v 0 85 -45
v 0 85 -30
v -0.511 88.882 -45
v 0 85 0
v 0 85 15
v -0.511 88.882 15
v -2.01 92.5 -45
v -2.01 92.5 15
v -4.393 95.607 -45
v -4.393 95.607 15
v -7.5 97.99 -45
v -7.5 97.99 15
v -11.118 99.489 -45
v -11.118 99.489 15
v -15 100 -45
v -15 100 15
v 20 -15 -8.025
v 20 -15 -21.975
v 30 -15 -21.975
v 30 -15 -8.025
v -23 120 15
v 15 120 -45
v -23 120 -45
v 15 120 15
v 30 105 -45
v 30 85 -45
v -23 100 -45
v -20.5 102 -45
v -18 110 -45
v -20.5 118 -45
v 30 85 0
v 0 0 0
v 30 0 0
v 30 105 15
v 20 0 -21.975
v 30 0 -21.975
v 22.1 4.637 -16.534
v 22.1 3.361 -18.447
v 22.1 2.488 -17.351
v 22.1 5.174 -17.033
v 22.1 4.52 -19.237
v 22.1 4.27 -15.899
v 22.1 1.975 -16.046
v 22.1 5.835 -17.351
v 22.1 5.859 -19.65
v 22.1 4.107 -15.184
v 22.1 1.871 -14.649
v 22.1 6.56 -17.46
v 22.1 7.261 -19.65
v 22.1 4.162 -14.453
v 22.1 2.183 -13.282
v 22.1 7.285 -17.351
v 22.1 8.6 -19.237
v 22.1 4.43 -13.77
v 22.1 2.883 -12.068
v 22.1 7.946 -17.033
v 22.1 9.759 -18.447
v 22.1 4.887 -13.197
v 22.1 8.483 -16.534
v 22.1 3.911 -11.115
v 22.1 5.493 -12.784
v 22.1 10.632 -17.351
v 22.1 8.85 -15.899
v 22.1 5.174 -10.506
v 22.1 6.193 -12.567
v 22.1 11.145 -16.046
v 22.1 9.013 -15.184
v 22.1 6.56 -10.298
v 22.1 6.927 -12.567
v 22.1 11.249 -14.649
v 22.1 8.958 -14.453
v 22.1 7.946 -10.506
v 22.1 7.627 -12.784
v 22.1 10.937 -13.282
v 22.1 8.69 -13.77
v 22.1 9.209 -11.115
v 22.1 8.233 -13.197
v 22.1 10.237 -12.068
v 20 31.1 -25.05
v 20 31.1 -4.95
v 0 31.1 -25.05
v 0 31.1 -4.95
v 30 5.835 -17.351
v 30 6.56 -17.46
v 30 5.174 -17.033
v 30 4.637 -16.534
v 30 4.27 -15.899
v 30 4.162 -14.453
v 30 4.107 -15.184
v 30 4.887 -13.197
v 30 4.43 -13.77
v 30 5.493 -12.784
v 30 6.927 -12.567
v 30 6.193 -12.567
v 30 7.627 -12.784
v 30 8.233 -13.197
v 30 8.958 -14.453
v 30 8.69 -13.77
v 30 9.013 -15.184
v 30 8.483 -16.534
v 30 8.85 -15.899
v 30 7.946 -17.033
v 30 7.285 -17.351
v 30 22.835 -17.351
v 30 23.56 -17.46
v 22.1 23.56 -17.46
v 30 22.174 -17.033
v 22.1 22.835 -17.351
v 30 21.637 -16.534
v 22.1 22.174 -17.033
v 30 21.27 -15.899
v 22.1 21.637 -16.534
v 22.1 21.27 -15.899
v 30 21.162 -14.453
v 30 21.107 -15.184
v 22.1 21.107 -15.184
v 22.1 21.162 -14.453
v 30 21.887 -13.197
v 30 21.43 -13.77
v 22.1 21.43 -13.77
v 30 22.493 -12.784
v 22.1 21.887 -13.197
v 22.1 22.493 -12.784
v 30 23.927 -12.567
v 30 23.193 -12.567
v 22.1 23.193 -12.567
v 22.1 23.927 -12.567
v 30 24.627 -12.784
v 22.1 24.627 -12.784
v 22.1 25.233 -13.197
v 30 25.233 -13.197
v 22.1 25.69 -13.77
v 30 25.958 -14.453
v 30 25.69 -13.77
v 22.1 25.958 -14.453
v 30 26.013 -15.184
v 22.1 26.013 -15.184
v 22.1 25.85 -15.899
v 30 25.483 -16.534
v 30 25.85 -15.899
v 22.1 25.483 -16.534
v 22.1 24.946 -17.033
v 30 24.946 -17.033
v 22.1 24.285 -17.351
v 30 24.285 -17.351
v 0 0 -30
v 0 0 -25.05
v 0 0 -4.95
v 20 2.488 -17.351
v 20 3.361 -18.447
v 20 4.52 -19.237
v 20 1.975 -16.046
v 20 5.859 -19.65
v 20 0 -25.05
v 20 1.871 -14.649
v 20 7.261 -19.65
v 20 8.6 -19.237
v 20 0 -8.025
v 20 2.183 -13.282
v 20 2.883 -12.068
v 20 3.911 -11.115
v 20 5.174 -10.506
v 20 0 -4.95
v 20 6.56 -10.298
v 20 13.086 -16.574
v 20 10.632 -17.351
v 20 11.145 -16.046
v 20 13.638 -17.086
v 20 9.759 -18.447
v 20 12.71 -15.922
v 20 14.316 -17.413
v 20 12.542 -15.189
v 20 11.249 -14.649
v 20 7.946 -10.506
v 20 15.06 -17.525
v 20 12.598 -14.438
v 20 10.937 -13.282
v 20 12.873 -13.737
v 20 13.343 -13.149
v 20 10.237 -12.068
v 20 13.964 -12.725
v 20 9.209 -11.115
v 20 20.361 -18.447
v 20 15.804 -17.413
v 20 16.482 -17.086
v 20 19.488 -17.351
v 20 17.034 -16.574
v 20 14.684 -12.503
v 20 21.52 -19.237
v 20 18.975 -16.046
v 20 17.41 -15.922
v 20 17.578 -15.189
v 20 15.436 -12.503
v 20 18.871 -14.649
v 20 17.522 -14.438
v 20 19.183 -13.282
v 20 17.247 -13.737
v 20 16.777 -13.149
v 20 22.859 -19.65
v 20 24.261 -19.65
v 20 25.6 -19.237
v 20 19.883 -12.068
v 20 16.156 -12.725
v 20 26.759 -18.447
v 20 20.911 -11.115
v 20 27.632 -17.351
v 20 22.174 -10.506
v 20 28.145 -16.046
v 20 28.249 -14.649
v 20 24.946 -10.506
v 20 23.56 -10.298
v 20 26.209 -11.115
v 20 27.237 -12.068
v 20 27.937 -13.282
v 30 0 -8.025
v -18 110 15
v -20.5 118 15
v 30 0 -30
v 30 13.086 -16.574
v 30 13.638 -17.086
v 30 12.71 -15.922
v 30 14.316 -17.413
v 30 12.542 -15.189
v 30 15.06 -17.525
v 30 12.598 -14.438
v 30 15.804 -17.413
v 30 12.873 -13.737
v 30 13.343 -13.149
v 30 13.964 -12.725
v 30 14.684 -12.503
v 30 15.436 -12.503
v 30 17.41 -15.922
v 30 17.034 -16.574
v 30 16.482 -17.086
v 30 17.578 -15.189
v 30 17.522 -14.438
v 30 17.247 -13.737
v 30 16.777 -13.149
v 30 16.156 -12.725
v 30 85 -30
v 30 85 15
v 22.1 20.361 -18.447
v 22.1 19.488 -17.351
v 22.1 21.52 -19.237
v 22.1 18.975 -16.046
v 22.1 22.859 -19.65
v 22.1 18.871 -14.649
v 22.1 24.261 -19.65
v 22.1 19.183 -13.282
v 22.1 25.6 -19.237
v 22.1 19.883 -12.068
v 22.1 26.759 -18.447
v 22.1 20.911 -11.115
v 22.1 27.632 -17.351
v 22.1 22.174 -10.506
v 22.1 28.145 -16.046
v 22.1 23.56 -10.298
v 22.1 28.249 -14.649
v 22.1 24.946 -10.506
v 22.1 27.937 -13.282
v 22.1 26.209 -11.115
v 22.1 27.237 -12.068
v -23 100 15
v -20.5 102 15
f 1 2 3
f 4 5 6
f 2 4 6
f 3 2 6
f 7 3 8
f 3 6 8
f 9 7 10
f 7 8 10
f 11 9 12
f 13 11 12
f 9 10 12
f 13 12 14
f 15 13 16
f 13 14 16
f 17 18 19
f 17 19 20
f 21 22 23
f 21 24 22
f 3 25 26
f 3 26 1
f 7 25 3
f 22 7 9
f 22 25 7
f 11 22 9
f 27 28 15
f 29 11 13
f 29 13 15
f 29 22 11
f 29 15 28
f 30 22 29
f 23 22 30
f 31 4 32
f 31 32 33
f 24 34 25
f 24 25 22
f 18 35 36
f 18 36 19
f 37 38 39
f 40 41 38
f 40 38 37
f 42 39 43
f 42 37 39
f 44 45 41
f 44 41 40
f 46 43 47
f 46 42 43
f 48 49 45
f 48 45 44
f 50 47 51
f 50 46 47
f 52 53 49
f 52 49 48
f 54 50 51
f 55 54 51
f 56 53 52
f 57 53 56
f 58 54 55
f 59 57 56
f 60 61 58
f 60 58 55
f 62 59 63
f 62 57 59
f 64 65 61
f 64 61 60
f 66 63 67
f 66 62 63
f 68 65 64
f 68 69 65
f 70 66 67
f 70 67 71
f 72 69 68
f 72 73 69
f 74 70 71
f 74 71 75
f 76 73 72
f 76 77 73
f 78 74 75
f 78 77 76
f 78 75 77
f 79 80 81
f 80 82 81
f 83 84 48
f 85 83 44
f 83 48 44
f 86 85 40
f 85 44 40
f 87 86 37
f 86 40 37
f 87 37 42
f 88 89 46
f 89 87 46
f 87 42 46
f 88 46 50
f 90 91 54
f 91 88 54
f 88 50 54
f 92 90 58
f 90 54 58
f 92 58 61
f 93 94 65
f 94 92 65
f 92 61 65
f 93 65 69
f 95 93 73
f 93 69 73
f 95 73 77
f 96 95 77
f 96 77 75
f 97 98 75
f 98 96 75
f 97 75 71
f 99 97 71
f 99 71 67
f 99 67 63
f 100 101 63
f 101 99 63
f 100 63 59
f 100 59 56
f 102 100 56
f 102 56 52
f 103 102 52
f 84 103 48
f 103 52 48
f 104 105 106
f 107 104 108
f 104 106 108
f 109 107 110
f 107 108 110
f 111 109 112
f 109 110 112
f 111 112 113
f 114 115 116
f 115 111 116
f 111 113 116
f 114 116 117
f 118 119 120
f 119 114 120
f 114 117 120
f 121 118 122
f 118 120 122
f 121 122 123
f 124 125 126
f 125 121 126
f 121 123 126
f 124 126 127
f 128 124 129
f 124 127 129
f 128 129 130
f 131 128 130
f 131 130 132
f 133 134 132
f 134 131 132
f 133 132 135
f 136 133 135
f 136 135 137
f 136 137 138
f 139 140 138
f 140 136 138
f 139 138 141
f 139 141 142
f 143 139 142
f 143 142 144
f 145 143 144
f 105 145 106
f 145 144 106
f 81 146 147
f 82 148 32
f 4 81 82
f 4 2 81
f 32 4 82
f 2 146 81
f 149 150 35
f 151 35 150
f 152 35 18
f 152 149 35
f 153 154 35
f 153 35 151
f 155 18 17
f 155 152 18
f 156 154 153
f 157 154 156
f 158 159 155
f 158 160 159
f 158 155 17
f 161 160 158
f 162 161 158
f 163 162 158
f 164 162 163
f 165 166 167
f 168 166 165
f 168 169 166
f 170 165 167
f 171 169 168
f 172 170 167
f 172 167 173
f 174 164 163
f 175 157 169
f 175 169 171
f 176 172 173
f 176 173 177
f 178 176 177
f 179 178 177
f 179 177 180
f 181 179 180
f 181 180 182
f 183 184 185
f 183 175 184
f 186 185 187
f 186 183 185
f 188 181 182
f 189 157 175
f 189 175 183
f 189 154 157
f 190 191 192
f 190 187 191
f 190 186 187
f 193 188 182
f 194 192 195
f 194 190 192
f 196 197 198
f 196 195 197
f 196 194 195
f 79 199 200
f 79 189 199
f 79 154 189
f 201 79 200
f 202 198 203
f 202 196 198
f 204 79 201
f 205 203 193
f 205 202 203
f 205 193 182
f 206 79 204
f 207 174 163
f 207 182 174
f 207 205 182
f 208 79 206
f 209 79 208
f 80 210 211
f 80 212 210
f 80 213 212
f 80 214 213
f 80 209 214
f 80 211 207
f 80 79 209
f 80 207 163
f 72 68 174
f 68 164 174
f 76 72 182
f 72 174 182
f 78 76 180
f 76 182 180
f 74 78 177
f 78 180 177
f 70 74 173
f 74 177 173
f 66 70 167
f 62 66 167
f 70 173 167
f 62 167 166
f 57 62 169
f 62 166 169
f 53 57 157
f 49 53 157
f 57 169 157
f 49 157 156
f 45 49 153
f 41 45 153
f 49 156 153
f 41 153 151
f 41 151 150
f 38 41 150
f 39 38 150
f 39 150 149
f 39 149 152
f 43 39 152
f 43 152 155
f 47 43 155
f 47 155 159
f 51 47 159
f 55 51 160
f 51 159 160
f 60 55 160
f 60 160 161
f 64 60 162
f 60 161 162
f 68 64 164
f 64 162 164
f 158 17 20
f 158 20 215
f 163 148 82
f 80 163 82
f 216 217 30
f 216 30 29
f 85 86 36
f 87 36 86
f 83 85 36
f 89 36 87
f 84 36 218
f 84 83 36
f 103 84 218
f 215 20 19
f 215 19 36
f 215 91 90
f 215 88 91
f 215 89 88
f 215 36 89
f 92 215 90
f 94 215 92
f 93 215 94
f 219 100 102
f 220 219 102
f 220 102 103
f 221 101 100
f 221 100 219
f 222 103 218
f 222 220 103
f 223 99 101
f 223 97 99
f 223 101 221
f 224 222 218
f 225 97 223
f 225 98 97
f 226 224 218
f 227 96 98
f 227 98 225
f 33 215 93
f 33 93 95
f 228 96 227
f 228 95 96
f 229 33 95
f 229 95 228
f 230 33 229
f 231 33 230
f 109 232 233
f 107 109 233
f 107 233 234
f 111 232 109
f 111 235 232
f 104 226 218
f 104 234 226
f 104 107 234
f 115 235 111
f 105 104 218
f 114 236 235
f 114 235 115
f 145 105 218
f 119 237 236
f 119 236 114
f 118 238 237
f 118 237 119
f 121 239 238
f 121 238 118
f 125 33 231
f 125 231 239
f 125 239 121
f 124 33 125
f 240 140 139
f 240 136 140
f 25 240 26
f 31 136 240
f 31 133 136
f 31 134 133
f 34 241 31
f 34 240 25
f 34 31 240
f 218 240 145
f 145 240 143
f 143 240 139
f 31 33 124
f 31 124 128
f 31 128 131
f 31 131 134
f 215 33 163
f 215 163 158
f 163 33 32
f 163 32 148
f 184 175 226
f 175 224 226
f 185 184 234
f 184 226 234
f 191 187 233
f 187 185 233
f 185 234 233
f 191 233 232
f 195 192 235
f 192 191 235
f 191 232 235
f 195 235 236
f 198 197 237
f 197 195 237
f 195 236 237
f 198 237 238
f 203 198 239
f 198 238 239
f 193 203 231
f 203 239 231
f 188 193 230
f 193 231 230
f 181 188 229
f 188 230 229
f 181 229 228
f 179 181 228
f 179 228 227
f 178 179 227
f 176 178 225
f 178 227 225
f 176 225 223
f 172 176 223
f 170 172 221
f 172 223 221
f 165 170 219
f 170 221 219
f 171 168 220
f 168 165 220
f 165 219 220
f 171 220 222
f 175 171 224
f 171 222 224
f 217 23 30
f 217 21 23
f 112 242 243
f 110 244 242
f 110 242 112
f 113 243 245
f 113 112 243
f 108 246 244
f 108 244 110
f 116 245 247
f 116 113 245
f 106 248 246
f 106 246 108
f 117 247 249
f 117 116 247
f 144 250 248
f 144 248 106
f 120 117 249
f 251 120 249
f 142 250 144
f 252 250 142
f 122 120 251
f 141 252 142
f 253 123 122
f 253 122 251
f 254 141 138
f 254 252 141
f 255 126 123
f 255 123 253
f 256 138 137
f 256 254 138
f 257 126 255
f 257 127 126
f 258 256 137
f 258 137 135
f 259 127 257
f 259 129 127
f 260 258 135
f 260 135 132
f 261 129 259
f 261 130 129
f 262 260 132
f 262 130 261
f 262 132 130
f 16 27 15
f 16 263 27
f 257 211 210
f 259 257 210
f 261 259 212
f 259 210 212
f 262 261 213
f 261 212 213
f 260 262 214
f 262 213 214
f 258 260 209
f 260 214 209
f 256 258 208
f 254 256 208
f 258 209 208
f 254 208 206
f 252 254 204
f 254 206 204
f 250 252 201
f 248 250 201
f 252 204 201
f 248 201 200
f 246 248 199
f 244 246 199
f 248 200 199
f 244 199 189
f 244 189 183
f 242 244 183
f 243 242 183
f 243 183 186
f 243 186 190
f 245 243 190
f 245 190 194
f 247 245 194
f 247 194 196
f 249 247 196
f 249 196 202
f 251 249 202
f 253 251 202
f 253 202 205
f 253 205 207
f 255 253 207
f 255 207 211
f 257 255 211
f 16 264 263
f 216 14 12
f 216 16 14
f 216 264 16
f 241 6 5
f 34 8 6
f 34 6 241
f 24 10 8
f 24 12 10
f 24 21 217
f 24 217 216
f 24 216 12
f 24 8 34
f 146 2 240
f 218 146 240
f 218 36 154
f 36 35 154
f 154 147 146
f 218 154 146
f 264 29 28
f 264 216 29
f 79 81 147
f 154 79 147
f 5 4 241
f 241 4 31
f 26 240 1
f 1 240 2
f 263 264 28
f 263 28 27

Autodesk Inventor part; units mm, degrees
ref_plane "YZ Plane" through (0, 0, 0) normal (1, 0, 0) x (0, 1, 0)
ref_plane "XZ Plane" through (0, 0, 0) normal (0, 1, 0) x (-1, 0, 0)
sketch "Sketch1" plane through (0, 0, 0) normal (0, 0, 1) x (1, 0, 0)
  line L0 (0, 0) -> (25, 0)
  line L1 (25, 0) -> (25, 40)
  line L2 (25, 40) -> (0, 40)
  line L3 (0, 40) -> (0, 0)
  dimension "d1" = 25
  dimension "d2" = 40
  dimension "d3" = 25
extrude "Extrusion1" add sketch "Sketch1" against normal blind 30
sketch "Sketch2" plane through (25, 0, 0) normal (1, 0, 0) x (0, 0, -1)
  line L0 (0, 0) -> (30, 0) projected
  circle A0 centre (15, 6.56) radius 2.46
extrude "Extrusion2" cut sketch "Sketch2" against normal blind 30
sketch "Sketch3" plane through (0, 0, 0) normal (-1, 0, 0) x (0, 0, 1)
  line L0 (0, 0) -> (-30, 0) projected
  line L1 (-25.05, 0) -> (-4.95, 0)
  line L2 (-4.95, 0) -> (-4.95, 33.12)
  line L3 (-4.95, 33.12) -> (-25.05, 33.12)
  line L4 (-25.05, 33.12) -> (-25.05, 0)
  dimension "d11" = 20.1
extrude "Extrusion3" cut sketch "Sketch3" against normal blind 20
sketch "Sketch4" plane through (0, 0, 0) normal (0, -1, 0) x (1, 0, 0)
  line L0 (20, -4.95) -> (20, -25.05) projected
  line L1 (20, -15) -> (25, -15)
  line L2 (25, 0) -> (25, -30) projected
  line L3 (20, -8.025) -> (25, -8.025)
  line L4 (25, -8.025) -> (25, -21.975)
  line L5 (25, -21.975) -> (20, -21.975)
  line L6 (20, -21.975) -> (20, -8.025)
  line L7 (20, -8.025) -> (25, -21.975) construction
  line L8 (25, -8.025) -> (20, -21.975) construction
  line L9 (25, -12.54) -> (25, -17.46) projected
  point P0 (0, 0)
  point P1 (22.5, -15)
  dimension "d14" = 13.95
extrude "Extrusion4" add sketch "Sketch4" along normal blind 15
sketch "Sketch5" plane through (20, 0, 0) normal (-1, 0, 0) x (0, 0, 1)
  circle A0 centre (-15, 6.56) radius 2.46 projected
  circle A1 centre (-15, 6.56) radius 4.7025
  circle A2 centre (-15, 6.56) radius 2.46 projected
  circle A3 centre (-15, 6.56) radius 2.46
  point P0 (0, 0)
  dimension "d17" = 9.405
extrude "Extrusion5" cut sketch "Sketch5" against normal blind 2.1
sketch "Sketch6" plane through (25, 0, 0) normal (1, 0, 0) x (0, 0, -1)
  circle A0 centre (15, 6.56) radius 4.7025 projected
  line L0 (15, 6.56) -> (15, 23.56)
  circle A1 centre (15, 23.56) radius 2.46
  point P0 (0, 0)
  dimension "d20" = 17
  dimension "d21" = 4.92
extrude "Extrusion6" cut sketch "Sketch6" against normal blind 10 contours A1
sketch "Sketch7" plane through (20, 0, 0) normal (-1, 0, 0) x (0, 0, 1)
  circle A0 centre (-15, 23.56) radius 2.46 projected
  circle A1 centre (-15, 23.56) radius 4.7025
  point P0 (0, 0)
  dimension "d24" = 9.405
extrude "Extrusion7" cut sketch "Sketch7" against normal blind 2.1
sketch "Sketch9" plane through (25, 0, 0) normal (1, 0, 0) x (0, 0, -1)
  circle A0 centre (15, 6.56) radius 2.46 projected
  circle A1 centre (15, 6.56) radius 2.46
  circle A2 centre (15, 23.56) radius 2.46 projected
  circle A3 centre (15, 23.56) radius 2.46
  line L0 (30, 40) -> (30, 0) projected
  line L1 (30, 0) -> (30, 40)
  line L2 (30, 40) -> (0, 40)
  line L3 (0, 40) -> (0, 0)
  line L4 (0, 0) -> (8.025, 0) projected
  line L5 (21.975, 0) -> (21.975, -15)
  line L6 (21.975, -15) -> (8.025, -15)
  line L7 (8.025, -15) -> (8.025, 0)
  line L8 (0, 0) -> (8.025, 0)
  line L9 (21.975, 0) -> (30, 0)
extrude "Extrusion8" add sketch "Sketch9" along normal blind 5
sketch "Sketch10" plane through (0, 40, 0) normal (0, 1, 0) x (1, 0, 0)
  line L0 (0, 30) -> (30, 30) projected
  line L1 (30, 0) -> (0, 0) projected
  line L2 (0, 30) -> (30, 30)
  line L3 (30, 30) -> (30, 0)
  line L4 (30, 0) -> (0, 0)
  line L5 (0, 0) -> (0, 30)
extrude "Extrusion9" add sketch "Sketch10" along normal blind 30
sketch "Sketch12" plane through (30, 0, 0) normal (1, 0, 0) x (0, 0, -1)
  circle A0 centre (15, 6.56) radius 2.46 projected
  line L0 (15, 6.56) -> (15, 15.06)
  circle A1 centre (15, 15.06) radius 2.525
  point P0 (0, 0)
  dimension "d31" = 8.5
  dimension "d33" = 5.05
extrude "Extrusion10" cut sketch "Sketch12" against normal blind 30 contours A1
sketch "Sketch14" plane through (0, 0, 0) normal (0, 0, 1) x (1, 0, 0)
  line L0 (30, 70) -> (0, 70) projected
  line L1 (0, 70) -> (0, 85)
  line L2 (-15, 100) -> (-23, 100)
  line L3 (30, 0) -> (30, 70) projected
  line L4 (30, 100) -> (30, 70)
  arc A0 (0, 85) -> (-15, 100) centre (-15, 85) ccw
  line L5 (-23, 120) -> (15, 120)
  line L6 (-20.5, 118) -> (-18, 110)
  line L7 (-20.5, 118) -> (-23, 120)
  line L8 (-20.5, 102) -> (-18, 110)
  line L9 (-20.5, 102) -> (-23, 100)
  line L10 (30, 105) -> (15, 120)
  line L11 (30, 105) -> (30, 100)
  point P0 (0, 0)
  point P1 (0, 100)
  dimension "d47" = 30
  dimension "d54" = 15
  dimension "d60" = 20
extrude "Extrusion12" add sketch "Sketch14" against normal blind 30
sketch "Sketch15" plane through (0, 0, -25.05) normal (-1, 0, 0) x (0, 0, 1)
  line L0 (0, 33.12) -> (20.1, 33.12) projected
  line L1 (20.1, 33.12) -> (20.1, 0) projected
  line L2 (0, 33.12) -> (20.1, 33.12)
  line L3 (20.1, 33.12) -> (20.1, 31.1)
  line L4 (20.1, 31.1) -> (0, 31.1)
  line L5 (0, 31.1) -> (0, 33.12)
  point P0 (25.05, 0)
  dimension "d57" = 2.02
extrude "Extrusion13" add sketch "Sketch15" against normal blind 20
sketch "Sketch19" plane through (0, 0, 0) normal (0, 0, 1) x (1, 0, 0)
  arc A0 (0, 85) -> (-15, 100) centre (-15, 85) ccw projected
  arc A1 (0, 85) -> (-15, 100) centre (-15, 85) ccw
  line L0 (-15, 100) -> (-23, 100) projected
  line L1 (-15, 100) -> (-23, 100)
  line L2 (-23, 100) -> (-20.5, 102) projected
  line L3 (-23, 100) -> (-20.5, 102)
  line L4 (-20.5, 102) -> (-18, 110) projected
  line L5 (-20.5, 102) -> (-18, 110)
  line L6 (-18, 110) -> (-20.5, 118) projected
  line L7 (-18, 110) -> (-20.5, 118)
  line L8 (-23, 120) -> (15, 120) projected
  line L9 (-20.5, 118) -> (-23, 120)
  line L10 (-23, 120) -> (15, 120)
  line L11 (15, 120) -> (30, 105) projected
  line L12 (15, 120) -> (30, 105)
  line L13 (30, 105) -> (30, 85)
  line L14 (30, 0) -> (30, 105) projected
  line L15 (0, 85) -> (30, 85)
  point P0 (0, 0)
extrude "Extrusion14" add sketch "Sketch19" along normal blind 15
ref_plane "Work Plane1" through (0, 0, -15) normal (0, 0, 1) x (1, 0, 0)
mirror "Mirror1" about plane through (0, 0, -15) normal (0, 0, 1) of "Extrusion14"
properties part number "16mm_x_60mm"
